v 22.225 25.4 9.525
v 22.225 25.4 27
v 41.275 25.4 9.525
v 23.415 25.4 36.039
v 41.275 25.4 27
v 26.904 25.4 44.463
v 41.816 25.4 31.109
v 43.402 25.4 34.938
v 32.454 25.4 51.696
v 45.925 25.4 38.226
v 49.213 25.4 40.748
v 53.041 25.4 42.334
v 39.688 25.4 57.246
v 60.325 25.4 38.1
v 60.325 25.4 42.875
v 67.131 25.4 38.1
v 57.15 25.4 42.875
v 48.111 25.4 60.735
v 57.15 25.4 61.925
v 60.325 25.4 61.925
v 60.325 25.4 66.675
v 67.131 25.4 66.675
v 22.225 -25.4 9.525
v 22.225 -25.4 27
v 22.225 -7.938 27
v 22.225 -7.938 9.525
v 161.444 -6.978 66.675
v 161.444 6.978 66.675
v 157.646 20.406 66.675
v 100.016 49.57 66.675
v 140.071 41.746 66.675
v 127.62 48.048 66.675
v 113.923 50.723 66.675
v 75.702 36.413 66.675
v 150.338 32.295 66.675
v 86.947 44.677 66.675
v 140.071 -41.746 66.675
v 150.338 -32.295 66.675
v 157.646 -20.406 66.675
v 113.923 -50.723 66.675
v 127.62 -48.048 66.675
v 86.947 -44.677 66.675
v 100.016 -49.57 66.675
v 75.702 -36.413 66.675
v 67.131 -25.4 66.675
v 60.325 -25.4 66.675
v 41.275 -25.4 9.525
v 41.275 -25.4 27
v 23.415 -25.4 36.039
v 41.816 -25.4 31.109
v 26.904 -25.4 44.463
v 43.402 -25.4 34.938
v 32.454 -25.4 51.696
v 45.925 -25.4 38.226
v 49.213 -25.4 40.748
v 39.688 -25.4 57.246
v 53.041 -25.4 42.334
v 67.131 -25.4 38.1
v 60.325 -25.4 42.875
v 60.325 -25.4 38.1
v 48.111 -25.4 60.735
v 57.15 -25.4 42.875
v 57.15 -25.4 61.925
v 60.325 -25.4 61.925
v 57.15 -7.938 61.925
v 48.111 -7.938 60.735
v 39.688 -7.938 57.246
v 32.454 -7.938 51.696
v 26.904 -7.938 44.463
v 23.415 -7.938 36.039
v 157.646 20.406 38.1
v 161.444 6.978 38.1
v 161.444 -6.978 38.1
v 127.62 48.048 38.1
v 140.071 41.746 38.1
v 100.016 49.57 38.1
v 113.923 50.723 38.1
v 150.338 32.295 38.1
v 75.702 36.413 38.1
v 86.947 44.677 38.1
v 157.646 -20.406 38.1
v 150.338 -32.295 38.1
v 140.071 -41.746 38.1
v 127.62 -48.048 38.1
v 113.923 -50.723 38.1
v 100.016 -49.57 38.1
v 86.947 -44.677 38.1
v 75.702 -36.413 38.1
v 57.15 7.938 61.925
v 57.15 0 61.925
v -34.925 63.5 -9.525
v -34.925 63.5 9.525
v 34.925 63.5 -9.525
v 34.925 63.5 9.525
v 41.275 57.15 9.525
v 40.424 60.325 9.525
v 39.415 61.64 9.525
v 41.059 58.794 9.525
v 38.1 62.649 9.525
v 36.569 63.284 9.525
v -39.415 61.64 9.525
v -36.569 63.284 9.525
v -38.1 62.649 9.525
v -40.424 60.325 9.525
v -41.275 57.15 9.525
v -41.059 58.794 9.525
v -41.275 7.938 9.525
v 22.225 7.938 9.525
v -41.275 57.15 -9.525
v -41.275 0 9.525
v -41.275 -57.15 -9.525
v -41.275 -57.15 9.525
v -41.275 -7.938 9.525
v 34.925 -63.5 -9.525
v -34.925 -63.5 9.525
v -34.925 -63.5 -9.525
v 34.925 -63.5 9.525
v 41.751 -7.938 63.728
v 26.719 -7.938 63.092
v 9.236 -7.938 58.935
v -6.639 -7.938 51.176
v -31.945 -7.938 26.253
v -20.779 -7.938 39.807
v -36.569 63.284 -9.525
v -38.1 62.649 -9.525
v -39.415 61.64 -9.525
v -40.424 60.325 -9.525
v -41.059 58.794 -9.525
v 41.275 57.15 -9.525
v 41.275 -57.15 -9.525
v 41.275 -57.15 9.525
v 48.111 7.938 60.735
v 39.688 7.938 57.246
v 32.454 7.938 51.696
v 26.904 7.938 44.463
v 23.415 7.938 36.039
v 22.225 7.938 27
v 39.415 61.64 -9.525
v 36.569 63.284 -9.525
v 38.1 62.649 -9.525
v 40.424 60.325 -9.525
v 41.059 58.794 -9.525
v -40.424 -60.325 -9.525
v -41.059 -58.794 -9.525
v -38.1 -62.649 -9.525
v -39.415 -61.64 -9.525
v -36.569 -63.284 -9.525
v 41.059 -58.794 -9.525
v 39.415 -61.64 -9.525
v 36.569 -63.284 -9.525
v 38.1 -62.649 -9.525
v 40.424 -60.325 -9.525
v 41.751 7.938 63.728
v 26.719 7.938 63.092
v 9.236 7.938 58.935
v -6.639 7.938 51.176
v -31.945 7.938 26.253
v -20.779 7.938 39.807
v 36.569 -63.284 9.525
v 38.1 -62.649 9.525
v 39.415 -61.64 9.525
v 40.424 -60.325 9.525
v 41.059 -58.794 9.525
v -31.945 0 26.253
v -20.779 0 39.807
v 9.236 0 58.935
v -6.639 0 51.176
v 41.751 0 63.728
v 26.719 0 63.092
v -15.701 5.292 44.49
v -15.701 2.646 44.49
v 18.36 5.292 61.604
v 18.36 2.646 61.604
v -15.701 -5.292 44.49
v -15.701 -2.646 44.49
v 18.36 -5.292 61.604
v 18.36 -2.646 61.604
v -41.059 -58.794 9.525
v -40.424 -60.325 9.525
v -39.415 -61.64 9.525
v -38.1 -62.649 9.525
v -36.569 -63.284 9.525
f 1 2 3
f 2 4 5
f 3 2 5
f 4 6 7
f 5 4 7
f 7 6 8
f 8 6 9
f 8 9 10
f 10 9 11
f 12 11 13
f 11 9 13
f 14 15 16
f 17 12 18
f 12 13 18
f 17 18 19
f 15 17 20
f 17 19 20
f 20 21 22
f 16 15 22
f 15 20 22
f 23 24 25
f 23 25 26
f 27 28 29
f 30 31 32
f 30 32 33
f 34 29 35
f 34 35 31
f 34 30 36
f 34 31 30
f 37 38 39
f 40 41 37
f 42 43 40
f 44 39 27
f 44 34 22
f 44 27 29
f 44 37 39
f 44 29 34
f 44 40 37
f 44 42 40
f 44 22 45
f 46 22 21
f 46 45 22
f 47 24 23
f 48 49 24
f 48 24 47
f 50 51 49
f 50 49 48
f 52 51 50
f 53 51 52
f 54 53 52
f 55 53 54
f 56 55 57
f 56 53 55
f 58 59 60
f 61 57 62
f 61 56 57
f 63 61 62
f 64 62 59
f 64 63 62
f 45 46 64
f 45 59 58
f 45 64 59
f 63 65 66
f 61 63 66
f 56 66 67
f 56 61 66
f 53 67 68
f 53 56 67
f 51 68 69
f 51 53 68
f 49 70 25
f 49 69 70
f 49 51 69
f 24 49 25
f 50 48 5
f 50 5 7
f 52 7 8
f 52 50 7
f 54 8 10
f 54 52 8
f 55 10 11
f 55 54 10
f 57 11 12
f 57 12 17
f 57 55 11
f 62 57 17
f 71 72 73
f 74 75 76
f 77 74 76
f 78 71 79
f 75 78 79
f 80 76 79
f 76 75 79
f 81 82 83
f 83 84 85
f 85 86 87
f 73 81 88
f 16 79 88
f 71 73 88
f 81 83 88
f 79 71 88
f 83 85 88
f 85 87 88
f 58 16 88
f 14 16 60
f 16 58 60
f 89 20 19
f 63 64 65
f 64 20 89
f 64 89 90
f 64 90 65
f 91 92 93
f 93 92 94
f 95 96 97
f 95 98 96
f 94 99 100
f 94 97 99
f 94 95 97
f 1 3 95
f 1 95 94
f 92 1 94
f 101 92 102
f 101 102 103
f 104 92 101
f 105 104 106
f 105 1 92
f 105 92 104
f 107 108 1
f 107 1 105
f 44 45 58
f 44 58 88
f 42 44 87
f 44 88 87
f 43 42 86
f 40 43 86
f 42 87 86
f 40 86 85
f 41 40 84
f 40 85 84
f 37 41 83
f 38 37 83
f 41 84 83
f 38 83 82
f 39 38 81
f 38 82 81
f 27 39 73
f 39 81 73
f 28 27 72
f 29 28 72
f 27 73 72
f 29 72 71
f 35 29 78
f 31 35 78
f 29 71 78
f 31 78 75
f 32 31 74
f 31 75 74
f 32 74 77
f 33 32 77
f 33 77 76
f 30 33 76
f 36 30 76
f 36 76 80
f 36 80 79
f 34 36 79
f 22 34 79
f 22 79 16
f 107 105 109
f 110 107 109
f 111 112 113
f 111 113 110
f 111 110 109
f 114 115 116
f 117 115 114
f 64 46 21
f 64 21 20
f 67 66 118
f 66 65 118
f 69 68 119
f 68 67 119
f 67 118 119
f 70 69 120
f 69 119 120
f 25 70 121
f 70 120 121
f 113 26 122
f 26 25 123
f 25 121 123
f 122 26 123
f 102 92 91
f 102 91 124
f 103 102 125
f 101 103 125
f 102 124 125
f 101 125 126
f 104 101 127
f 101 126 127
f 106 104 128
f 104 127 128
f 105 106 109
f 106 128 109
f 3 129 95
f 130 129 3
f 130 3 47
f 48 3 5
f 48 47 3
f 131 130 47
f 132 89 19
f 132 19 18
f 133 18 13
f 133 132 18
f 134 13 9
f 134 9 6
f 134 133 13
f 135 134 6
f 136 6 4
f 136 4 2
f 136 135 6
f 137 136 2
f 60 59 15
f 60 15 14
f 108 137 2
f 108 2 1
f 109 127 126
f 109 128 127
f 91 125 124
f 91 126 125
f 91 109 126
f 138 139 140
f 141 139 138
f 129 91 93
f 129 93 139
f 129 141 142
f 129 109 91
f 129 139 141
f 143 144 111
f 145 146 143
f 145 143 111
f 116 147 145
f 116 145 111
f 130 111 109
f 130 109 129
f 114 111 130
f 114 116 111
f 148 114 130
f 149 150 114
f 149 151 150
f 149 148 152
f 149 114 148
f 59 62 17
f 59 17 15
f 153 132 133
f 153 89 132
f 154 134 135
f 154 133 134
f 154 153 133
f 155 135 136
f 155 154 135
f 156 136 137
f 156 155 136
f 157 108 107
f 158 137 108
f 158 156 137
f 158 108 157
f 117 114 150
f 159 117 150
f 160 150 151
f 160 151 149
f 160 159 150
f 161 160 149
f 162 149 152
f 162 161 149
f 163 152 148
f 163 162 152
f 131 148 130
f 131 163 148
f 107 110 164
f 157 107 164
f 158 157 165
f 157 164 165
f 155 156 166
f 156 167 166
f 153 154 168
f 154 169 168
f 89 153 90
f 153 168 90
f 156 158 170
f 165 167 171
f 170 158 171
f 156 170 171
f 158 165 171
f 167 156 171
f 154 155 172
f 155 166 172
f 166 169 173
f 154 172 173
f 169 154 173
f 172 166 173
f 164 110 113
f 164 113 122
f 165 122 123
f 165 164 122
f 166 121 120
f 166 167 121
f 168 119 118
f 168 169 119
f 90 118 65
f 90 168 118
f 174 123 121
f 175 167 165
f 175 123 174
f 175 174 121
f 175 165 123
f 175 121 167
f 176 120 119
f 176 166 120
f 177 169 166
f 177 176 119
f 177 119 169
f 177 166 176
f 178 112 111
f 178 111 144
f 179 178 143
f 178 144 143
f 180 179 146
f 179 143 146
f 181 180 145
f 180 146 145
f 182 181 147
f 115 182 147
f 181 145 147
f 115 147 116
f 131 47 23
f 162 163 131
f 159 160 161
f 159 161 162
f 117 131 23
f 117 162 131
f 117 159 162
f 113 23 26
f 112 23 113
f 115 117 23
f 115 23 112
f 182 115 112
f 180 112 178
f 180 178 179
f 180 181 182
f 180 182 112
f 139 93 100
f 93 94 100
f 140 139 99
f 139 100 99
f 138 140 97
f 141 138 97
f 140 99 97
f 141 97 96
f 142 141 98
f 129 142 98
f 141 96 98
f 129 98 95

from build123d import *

# Parameters (mm, degrees)
F1_DEPTH = 63.5
F2_DEPTH = 25.4
F3_DEPTH = 7.9375
F5_R     = 6.35


with BuildPart() as f1:
    # F0 (on Front) → F1 (new body, symmetric)
    with BuildSketch(Plane.XZ):
        Polygon((-41.275, 9.525), (-41.275, -9.525), (41.275, -9.525), (41.275, 9.525), (22.225, 9.525), align=None)
    extrude(amount=F1_DEPTH, both=True)

    # F0 (on Front) → F2 (join, symmetric)
    with BuildSketch(Plane.XZ):
        with BuildLine():
            Line((22.225, 9.525), (41.275, 9.525))
            Line((41.275, 9.525), (41.275, 27.0002))
            ThreePointArc((41.275, 27.0002), (45.92468, 38.22552), (57.15, 42.8752))
            Line((57.15, 42.8752), (60.325, 42.8752))
            Line((60.325, 42.8752), (60.325, 61.9252))
            Line((60.325, 61.9252), (57.15, 61.9252))
            ThreePointArc((57.15, 61.9252), (32.454296, 51.695904), (22.225, 27.0002))
            Line((22.225, 27.0002), (22.225, 9.525))
        make_face()
        Polygon((60.325, 66.675), (60.325, 61.9252), (60.325, 42.8752), (60.325, 38.1), (111.125, 38.1), (111.125, 66.675), align=None)
    extrude(amount=F2_DEPTH, both=True)

    # F0 (on Front) → F3 (join, symmetric)
    with BuildSketch(Plane.XZ):
        with BuildLine():
            add(Edge.make_bspline(
                [(-41.275, 9.525), (-21.197749, 53.768482), (17.248105, 69.648288), (57.15, 61.9252)],
                knots=[0, 0, 0, 0, 111.504536, 111.504536, 111.504536, 111.504536], degree=3))
            Line((-41.275, 9.525), (22.225, 9.525))
            Line((22.225, 9.525), (22.225, 27.0002))
            ThreePointArc((22.225, 27.0002), (32.454296, 51.695904), (57.15, 61.9252))
        make_face()
    extrude(amount=F3_DEPTH, both=True)

    # F0 (on Front) → F4 (revolve)
    with BuildSketch(Plane.XZ):
        Polygon((60.325, 66.675), (60.325, 61.9252), (60.325, 42.8752), (60.325, 38.1), (111.125, 38.1), (111.125, 66.675), align=None)
    revolve(axis=Axis((111.125, 0, 52.3875), (0, 0, 1)))

    # F5
    f5_edges = [f1.edges().sort_by_distance(p)[0] for p in [
        (-41.275, -63.5, 0),
        (-41.275, 63.5, 0),
        (41.275, 63.5, 0),
        (41.275, -63.5, 0),
    ]]
    fillet(f5_edges, radius=F5_R)


solid = f1.part
